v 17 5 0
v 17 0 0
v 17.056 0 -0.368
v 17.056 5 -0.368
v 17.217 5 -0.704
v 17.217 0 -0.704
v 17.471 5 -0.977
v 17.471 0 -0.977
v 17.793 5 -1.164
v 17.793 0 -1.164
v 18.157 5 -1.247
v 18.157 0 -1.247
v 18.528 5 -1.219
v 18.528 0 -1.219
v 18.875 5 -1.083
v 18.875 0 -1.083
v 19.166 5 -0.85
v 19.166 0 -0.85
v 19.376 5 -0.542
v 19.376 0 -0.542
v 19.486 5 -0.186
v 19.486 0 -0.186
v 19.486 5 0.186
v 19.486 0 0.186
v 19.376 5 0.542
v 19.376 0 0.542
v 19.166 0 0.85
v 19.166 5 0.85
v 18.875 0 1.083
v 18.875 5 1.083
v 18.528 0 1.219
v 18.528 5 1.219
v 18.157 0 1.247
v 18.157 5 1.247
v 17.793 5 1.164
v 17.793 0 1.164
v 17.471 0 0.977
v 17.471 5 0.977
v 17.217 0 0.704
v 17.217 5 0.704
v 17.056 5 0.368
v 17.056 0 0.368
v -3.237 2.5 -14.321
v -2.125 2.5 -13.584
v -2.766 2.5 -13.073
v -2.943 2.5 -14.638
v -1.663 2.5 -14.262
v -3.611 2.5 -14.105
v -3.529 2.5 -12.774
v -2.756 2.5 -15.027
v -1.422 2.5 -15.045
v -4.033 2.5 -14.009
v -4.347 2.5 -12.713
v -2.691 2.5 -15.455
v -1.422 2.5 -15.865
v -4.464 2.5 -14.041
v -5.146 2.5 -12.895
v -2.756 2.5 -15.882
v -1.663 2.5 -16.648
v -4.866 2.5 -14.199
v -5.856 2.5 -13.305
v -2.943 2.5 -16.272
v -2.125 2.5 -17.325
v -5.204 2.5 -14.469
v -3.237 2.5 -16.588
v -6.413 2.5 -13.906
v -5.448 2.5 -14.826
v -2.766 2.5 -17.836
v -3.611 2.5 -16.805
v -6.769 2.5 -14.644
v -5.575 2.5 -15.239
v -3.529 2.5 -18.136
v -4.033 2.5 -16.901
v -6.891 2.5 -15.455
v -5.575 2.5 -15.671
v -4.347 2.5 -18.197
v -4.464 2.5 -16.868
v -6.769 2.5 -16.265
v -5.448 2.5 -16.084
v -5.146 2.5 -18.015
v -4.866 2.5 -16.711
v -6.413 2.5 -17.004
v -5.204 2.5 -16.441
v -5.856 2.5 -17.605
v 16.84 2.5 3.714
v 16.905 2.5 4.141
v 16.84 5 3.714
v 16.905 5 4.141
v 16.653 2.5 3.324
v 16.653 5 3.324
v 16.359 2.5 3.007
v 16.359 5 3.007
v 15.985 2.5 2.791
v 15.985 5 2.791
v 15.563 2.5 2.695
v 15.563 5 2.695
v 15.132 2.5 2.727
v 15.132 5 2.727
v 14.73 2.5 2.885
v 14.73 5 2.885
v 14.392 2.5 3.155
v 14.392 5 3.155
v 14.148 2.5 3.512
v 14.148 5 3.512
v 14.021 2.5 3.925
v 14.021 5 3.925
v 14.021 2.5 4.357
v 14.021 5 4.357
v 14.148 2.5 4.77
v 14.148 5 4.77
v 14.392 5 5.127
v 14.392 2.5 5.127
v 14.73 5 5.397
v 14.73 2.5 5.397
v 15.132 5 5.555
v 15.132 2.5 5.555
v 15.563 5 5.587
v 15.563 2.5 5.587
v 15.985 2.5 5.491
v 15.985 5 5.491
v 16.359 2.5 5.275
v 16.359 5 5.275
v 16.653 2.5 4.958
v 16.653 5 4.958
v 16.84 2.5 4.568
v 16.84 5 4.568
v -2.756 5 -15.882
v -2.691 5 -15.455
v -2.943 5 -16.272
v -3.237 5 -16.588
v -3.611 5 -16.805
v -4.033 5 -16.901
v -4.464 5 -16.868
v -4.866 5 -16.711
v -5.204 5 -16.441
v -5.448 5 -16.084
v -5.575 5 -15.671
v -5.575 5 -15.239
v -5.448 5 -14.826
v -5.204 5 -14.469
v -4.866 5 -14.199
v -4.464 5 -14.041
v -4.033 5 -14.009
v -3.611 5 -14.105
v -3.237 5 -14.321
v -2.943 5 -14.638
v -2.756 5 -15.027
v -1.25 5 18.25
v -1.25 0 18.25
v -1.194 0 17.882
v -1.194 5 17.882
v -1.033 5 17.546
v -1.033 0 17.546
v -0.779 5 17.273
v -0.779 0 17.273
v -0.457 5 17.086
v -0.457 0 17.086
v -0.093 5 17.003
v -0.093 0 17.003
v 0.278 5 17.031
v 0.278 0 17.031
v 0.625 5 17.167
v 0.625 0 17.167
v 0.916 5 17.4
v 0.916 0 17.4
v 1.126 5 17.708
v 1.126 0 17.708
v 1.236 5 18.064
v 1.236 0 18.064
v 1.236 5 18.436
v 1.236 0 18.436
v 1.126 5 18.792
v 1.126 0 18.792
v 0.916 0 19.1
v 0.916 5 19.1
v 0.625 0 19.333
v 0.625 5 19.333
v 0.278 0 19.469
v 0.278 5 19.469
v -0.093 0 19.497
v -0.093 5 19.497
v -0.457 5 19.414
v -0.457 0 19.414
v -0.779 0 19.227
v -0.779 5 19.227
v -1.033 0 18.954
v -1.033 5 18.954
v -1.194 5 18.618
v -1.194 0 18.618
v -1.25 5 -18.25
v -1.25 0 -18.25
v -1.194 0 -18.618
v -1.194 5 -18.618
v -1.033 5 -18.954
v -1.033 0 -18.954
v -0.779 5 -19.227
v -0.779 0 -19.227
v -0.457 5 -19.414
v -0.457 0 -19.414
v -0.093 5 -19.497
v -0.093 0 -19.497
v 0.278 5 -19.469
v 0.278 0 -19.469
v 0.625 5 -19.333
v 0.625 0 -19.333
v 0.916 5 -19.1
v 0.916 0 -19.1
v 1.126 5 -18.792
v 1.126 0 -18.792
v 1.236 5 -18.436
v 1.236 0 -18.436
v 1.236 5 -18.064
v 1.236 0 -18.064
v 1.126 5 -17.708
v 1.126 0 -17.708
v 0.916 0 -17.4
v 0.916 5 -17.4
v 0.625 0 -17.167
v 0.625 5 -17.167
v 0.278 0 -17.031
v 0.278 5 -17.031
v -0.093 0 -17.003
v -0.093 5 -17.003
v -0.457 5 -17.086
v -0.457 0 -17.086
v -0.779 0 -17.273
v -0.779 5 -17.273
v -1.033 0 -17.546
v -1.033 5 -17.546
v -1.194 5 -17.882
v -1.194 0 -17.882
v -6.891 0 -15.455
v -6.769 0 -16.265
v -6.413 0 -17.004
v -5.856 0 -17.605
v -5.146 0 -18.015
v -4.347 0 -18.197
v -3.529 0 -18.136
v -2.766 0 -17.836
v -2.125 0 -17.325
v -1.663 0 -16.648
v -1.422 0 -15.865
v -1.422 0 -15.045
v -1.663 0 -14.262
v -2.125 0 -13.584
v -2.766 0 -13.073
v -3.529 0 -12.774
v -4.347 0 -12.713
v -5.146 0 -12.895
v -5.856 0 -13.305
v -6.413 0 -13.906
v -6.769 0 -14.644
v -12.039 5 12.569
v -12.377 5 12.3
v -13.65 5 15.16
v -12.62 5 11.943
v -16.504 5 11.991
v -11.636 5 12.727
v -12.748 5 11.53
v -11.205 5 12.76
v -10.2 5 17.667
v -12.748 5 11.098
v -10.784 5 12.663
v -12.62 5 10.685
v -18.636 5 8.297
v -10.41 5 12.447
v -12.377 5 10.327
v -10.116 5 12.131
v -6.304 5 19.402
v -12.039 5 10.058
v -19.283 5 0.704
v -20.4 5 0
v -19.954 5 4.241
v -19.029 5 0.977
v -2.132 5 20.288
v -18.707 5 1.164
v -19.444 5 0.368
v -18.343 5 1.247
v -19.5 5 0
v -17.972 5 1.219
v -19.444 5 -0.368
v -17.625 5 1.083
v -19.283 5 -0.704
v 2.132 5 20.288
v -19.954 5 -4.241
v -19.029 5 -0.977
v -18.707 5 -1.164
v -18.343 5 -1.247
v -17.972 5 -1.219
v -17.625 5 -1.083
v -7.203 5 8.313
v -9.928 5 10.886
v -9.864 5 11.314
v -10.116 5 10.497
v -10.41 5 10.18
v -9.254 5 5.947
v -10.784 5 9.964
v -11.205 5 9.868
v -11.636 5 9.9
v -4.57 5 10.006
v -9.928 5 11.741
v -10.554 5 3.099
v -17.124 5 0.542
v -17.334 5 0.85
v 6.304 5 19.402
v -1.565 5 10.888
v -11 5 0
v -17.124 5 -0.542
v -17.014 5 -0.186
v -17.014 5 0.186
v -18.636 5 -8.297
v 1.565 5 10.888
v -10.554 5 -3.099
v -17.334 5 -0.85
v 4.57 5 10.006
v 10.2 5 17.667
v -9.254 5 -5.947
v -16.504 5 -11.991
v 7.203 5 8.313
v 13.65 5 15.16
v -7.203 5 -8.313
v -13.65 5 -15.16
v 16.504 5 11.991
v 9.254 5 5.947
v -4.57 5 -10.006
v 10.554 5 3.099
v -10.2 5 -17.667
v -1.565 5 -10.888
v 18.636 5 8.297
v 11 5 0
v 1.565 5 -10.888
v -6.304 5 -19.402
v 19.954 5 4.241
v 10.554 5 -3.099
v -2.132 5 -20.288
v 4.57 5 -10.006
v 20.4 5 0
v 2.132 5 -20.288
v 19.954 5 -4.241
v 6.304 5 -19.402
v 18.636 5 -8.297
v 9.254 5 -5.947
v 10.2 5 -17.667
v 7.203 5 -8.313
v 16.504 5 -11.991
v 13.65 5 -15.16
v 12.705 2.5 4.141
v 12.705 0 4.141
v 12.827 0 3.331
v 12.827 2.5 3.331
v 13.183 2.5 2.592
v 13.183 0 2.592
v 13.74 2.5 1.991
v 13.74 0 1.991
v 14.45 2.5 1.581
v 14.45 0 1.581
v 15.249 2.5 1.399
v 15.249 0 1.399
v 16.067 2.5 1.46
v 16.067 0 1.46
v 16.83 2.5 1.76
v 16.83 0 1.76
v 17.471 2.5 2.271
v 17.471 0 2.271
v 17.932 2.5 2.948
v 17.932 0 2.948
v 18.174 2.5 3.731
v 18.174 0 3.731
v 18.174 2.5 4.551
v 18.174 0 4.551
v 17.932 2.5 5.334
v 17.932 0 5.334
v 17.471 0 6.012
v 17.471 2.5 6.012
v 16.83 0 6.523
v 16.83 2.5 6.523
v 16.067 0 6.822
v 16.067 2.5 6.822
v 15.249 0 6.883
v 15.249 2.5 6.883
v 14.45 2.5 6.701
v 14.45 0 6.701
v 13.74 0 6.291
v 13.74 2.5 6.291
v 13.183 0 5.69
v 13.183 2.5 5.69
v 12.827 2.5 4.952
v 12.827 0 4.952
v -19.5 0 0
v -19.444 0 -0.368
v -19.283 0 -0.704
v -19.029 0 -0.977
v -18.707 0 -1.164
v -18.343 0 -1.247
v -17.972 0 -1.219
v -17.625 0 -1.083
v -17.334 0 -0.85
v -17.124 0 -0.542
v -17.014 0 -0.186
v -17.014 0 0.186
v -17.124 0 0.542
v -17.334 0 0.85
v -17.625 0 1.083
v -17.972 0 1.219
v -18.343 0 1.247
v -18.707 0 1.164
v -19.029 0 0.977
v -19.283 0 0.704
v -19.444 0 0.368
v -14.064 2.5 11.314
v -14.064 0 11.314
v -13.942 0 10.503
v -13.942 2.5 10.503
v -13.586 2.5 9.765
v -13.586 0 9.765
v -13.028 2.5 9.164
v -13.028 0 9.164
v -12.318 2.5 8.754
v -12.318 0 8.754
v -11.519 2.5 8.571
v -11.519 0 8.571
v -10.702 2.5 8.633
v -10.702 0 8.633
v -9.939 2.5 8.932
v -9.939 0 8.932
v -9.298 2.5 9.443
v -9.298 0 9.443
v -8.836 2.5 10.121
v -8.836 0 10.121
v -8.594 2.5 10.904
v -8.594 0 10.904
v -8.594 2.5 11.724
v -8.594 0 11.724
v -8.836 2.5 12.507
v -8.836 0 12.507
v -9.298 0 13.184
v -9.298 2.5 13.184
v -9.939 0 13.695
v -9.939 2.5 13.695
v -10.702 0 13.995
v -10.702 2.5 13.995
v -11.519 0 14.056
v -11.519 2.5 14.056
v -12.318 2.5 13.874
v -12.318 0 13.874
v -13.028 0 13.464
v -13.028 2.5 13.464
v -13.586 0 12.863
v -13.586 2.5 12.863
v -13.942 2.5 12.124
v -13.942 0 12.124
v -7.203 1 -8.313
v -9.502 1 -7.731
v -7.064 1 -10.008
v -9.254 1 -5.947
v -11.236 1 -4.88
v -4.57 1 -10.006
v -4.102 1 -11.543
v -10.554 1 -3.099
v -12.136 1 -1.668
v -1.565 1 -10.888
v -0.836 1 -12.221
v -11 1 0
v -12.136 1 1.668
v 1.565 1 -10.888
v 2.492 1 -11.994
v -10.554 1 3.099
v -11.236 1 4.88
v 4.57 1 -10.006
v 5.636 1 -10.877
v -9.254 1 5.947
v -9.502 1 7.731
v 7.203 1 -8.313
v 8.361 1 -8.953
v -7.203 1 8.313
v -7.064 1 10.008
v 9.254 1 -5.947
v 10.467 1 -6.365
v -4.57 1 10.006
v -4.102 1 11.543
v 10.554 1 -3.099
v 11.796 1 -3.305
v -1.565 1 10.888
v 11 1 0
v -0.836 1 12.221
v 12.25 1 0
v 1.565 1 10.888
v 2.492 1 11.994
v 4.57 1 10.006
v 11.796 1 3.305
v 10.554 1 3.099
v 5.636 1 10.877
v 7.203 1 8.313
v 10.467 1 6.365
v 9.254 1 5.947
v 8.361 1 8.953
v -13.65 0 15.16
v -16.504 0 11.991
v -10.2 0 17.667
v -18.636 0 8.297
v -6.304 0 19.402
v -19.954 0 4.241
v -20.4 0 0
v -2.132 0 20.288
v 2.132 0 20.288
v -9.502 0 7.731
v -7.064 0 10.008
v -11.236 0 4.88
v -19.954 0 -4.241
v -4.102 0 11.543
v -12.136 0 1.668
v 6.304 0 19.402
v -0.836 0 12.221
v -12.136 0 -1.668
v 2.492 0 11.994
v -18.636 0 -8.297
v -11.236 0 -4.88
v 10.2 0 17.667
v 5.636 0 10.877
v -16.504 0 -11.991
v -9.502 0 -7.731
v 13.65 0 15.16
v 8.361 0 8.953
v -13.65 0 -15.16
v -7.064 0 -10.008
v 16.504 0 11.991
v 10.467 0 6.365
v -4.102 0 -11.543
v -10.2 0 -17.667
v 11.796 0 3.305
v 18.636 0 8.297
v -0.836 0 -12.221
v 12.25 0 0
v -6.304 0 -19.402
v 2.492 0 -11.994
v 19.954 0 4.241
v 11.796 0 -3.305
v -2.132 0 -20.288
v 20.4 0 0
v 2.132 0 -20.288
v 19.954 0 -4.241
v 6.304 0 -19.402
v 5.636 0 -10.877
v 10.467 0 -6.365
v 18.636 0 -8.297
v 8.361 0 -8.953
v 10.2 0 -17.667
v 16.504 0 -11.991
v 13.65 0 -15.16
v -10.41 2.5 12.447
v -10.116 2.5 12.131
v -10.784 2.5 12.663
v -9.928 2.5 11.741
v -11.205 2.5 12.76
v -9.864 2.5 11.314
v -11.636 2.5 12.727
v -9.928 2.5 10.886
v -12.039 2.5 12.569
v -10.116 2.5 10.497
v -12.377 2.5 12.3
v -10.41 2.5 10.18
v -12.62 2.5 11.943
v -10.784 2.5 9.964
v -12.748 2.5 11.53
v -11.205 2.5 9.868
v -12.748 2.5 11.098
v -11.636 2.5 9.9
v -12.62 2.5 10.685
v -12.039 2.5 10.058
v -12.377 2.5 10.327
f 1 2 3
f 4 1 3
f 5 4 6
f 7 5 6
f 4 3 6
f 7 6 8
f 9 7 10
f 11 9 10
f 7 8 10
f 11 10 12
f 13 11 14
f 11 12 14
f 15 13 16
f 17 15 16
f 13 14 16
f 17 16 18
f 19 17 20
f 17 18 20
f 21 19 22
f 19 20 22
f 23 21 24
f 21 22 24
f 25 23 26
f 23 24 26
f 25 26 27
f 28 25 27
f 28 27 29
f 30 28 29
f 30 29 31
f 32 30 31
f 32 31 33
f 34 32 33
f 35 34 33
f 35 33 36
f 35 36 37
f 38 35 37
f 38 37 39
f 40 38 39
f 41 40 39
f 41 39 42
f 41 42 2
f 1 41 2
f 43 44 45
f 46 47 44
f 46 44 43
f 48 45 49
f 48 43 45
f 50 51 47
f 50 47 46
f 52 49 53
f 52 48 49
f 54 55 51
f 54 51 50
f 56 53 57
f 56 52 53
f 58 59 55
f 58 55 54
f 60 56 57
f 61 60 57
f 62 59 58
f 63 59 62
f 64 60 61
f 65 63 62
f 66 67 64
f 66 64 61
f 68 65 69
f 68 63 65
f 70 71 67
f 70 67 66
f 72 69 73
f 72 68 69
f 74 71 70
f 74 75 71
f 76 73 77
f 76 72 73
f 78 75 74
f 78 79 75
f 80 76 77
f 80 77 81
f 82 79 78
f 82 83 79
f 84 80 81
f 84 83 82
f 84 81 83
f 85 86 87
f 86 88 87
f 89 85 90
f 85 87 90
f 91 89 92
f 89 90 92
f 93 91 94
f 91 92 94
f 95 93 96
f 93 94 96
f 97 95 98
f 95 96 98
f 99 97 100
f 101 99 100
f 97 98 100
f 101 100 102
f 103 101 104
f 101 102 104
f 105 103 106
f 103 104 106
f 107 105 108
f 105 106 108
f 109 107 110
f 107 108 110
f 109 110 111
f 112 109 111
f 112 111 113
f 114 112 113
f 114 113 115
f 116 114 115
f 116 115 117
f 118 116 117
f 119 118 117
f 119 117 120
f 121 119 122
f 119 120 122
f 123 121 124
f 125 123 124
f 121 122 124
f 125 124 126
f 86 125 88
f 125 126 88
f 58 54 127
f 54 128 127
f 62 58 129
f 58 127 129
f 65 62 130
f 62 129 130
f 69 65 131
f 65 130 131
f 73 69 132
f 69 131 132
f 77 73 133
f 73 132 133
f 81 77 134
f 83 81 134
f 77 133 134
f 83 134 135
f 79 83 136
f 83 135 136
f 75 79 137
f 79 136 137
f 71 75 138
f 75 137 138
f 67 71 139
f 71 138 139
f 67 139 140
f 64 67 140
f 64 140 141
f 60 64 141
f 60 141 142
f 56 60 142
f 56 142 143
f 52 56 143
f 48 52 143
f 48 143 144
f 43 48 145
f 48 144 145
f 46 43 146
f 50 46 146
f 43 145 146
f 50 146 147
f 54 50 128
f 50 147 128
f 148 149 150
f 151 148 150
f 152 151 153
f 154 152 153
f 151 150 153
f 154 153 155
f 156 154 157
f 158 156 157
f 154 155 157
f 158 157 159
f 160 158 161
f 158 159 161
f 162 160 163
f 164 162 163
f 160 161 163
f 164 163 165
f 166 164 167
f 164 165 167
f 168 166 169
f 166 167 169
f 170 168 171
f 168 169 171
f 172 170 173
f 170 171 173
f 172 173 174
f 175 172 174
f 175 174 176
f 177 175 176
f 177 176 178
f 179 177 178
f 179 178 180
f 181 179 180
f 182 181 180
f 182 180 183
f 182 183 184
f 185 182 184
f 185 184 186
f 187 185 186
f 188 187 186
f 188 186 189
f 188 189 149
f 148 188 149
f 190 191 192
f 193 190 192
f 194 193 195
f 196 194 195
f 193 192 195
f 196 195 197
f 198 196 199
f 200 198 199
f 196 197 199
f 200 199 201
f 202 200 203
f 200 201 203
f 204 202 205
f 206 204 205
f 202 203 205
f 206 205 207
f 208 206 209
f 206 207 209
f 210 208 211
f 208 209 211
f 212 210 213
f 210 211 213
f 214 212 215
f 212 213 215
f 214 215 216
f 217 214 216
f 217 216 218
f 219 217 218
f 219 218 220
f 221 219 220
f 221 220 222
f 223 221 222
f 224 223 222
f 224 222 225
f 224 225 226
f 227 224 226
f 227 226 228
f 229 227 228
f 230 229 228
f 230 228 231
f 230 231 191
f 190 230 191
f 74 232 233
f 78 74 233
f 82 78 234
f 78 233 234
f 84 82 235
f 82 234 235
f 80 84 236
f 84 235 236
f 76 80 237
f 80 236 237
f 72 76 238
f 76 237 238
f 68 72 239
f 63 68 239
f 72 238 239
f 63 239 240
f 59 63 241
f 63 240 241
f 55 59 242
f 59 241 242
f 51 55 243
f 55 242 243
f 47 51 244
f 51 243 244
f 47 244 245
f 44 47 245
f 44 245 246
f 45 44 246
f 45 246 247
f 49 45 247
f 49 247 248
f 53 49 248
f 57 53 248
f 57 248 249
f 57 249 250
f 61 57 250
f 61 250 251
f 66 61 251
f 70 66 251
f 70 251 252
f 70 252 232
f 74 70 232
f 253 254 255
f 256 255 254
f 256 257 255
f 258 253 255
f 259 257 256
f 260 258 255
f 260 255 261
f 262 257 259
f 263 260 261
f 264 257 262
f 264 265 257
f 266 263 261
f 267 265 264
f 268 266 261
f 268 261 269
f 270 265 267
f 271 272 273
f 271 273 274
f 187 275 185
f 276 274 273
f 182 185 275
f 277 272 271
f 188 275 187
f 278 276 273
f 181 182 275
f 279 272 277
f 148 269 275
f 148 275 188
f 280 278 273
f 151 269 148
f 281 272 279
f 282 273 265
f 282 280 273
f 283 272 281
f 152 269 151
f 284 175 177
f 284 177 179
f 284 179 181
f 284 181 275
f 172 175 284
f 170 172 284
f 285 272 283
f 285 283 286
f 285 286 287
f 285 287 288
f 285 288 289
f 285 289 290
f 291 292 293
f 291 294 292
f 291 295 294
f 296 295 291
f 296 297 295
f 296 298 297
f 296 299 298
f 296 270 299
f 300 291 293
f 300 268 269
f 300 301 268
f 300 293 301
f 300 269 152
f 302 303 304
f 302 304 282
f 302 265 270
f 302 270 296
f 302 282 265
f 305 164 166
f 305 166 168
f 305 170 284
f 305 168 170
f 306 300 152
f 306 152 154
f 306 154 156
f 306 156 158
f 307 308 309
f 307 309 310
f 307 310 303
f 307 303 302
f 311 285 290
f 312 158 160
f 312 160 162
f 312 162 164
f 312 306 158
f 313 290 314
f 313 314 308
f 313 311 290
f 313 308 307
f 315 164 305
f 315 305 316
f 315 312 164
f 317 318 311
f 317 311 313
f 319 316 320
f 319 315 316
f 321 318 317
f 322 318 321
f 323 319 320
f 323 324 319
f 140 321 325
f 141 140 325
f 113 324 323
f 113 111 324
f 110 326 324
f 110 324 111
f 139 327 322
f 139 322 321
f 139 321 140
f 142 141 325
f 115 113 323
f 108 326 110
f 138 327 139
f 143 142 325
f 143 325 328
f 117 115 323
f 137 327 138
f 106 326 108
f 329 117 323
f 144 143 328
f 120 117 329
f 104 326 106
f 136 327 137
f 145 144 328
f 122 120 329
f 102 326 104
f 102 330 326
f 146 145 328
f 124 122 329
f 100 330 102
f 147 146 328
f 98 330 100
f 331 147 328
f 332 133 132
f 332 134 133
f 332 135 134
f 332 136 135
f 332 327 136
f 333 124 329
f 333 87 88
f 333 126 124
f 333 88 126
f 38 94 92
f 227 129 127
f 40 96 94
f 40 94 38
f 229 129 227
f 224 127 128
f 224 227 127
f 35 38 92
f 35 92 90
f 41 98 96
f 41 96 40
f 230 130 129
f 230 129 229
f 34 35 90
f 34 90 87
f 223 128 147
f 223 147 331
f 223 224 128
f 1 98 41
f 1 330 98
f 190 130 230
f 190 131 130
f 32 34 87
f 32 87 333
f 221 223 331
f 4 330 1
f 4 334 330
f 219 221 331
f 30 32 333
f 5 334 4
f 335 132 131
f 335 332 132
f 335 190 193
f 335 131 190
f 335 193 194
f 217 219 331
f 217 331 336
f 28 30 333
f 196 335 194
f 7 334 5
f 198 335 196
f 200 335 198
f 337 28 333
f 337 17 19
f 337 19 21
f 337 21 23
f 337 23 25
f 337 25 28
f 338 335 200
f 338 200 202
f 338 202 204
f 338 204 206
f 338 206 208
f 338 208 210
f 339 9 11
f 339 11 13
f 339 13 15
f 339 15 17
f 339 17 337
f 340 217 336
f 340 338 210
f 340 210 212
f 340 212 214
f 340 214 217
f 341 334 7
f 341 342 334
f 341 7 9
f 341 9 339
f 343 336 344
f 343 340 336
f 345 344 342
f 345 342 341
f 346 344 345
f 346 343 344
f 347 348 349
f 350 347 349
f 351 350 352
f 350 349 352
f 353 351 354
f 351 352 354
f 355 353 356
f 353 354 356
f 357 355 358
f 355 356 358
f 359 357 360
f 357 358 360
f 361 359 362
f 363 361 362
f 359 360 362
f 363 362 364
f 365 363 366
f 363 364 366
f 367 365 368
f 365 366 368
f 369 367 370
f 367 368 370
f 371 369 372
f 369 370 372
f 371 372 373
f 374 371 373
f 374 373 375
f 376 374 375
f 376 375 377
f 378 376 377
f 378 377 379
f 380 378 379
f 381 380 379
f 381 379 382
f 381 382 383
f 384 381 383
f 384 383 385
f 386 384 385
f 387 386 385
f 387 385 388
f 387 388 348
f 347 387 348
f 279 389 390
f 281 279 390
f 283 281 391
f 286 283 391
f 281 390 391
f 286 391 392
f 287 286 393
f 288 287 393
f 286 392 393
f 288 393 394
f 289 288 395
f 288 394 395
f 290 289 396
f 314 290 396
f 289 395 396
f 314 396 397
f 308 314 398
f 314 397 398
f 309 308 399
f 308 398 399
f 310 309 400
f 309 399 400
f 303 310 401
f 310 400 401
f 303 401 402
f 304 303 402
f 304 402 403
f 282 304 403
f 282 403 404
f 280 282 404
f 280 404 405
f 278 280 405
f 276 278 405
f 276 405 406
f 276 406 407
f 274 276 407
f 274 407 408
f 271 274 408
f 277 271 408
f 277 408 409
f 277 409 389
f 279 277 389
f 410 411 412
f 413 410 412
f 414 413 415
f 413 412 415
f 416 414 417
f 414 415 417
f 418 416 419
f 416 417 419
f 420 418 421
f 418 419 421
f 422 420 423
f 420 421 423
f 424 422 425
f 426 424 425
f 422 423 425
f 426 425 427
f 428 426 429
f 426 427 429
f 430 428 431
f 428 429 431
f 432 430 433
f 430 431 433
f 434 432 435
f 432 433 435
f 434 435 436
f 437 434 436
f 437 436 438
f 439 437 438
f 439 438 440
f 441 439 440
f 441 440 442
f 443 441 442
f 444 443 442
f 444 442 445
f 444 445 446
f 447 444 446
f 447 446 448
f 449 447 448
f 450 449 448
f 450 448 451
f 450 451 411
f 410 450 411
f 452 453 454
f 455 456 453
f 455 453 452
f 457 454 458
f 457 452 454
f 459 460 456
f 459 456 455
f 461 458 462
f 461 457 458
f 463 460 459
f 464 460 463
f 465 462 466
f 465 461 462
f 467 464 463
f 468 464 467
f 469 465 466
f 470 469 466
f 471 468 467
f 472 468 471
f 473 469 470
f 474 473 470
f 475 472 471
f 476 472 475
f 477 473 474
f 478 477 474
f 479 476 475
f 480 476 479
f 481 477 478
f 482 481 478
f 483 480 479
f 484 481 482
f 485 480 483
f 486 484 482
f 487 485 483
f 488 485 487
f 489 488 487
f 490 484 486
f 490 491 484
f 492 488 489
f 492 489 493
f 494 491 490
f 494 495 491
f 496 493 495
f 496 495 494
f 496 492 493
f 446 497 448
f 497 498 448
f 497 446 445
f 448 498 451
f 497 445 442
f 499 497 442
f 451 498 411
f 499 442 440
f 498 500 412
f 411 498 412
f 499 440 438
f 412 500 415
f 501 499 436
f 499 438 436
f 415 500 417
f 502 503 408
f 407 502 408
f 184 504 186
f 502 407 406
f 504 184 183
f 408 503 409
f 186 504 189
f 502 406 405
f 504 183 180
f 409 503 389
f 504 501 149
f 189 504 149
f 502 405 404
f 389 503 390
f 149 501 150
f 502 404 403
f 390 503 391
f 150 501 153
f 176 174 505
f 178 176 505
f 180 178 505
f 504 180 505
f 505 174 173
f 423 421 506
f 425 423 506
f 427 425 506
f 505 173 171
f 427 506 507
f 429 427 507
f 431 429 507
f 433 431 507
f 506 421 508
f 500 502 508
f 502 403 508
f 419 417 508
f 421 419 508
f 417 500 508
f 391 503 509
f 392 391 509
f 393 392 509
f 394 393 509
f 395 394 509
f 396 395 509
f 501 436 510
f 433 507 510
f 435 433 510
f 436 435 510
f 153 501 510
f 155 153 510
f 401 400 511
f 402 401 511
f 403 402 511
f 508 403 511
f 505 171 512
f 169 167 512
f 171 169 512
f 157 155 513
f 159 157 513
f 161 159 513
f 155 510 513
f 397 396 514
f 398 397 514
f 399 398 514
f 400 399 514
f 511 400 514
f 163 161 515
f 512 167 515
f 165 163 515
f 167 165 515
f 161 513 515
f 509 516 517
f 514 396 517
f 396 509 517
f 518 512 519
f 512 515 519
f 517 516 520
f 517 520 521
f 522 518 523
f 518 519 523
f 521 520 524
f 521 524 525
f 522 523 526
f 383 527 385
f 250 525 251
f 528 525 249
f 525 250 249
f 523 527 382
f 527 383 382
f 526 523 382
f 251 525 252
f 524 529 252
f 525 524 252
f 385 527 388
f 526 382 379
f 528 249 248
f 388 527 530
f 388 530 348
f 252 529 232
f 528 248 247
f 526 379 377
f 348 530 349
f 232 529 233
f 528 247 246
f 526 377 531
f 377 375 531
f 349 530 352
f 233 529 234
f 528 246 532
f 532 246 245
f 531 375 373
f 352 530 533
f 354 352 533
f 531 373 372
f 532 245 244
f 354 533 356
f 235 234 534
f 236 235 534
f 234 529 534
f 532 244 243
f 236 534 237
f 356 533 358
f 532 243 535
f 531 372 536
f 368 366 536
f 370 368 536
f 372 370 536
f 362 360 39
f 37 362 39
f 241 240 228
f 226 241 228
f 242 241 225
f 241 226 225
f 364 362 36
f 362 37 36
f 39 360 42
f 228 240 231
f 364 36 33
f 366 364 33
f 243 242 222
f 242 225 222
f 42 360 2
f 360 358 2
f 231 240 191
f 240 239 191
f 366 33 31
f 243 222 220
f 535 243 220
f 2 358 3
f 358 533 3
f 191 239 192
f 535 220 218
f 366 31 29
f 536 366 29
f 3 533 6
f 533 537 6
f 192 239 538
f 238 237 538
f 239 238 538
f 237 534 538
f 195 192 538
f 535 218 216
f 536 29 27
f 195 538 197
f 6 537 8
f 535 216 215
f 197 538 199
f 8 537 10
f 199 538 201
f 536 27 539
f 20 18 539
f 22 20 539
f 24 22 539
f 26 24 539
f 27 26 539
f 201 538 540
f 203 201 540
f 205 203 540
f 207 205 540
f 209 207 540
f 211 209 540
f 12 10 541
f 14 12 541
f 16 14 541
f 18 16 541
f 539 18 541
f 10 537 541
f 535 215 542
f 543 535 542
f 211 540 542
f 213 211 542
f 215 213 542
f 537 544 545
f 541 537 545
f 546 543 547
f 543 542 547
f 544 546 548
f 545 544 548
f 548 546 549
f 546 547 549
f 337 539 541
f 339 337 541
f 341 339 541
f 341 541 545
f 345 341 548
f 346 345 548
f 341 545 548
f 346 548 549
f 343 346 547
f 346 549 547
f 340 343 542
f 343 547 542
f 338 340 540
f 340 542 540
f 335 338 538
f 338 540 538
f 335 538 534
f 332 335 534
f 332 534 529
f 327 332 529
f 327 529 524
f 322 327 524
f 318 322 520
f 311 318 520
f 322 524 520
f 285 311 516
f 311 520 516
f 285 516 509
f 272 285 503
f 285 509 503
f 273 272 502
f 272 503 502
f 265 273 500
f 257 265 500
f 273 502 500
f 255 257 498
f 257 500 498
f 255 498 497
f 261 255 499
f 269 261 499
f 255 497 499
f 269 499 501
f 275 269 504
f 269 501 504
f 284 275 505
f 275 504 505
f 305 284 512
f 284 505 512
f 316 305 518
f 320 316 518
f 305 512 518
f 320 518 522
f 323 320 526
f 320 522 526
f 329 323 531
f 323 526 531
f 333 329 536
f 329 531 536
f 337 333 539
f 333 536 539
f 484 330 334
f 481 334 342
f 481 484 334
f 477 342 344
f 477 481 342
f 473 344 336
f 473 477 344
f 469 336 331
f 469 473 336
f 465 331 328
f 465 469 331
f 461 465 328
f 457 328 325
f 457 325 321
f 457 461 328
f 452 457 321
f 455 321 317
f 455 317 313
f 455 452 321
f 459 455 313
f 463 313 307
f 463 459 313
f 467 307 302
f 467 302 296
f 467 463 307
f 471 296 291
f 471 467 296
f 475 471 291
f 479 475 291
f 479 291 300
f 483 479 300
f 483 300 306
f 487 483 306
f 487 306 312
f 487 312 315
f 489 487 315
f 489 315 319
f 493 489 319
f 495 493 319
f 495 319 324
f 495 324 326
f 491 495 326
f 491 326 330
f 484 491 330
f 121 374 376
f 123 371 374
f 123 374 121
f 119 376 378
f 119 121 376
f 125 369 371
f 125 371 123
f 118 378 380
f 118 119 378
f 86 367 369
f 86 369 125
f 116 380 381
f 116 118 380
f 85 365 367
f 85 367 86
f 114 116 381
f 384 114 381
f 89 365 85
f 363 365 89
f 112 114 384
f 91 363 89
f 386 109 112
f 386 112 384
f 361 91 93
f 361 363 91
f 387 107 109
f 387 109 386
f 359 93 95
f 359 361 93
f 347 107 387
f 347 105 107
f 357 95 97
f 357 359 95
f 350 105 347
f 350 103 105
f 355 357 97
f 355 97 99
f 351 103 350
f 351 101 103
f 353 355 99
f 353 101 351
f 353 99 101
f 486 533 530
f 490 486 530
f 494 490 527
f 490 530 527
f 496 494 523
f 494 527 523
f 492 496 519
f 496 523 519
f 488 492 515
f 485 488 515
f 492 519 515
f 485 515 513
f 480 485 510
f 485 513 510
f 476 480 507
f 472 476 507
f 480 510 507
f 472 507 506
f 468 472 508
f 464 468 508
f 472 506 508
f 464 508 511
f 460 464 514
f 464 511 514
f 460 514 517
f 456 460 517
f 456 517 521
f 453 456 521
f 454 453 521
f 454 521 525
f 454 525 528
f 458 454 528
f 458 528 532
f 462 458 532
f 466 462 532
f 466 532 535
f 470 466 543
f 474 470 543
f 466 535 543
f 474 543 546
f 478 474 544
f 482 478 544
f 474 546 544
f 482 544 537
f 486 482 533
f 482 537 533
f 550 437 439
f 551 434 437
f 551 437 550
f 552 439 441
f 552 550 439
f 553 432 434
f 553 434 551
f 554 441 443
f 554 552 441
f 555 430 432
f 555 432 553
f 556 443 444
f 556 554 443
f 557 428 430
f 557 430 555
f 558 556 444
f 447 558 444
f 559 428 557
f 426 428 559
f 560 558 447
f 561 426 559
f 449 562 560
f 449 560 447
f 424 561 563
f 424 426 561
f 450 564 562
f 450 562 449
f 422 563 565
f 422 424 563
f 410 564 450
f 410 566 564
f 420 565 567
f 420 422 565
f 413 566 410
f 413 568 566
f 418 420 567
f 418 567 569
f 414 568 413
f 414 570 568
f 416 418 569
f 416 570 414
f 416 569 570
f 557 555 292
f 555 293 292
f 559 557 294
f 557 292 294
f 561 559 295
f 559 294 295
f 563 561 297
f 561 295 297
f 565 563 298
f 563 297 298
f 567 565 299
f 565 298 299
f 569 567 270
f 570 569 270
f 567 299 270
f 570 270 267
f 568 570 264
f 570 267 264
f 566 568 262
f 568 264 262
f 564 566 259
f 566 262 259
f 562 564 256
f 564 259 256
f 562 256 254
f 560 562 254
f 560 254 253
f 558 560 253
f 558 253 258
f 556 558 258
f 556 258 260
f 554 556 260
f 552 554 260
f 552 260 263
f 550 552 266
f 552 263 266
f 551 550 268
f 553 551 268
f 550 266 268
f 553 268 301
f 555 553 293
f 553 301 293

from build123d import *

# Parameters (mm, degrees)
SKETCH_1_R                    = 20.4
SKETCH_1_R_2                  = 11
EXTRUDE_1_DEPTH               = 5
M3X0_51_D                     = 2.5
HOLE_WIZARD_M2_51_D           = 2.9
HOLE_WIZARD_M2_51_CBORE_D     = 5.5
HOLE_WIZARD_M2_51_CBORE_DEPTH = 2.5
SKETCH_9_R                    = 12.25
CUT_EXTRUDE_1_DEPTH           = 1


with BuildPart() as part:
    # Эскиз1 → Бобышка-Вытянуть1 (new body)
    with BuildSketch(Plane(origin=(0, 0, 0), x_dir=(1, 0, 0), z_dir=(0, 1, 0))):
        Circle(SKETCH_1_R)
        Circle(SKETCH_1_R_2, mode=Mode.SUBTRACT)
    extrude(amount=EXTRUDE_1_DEPTH)

    # Отверстие обработанное метчиком M3x0.51 (through all)
    with Locations(Plane(origin=(0, 5, 0), x_dir=(1, 0, 0), z_dir=(0, 1, 0))):
        with Locations((-18.25, 0), (0, 18.25), (18.25, 0), (0, -18.25)):
            Hole(M3X0_51_D / 2)

    # Цековка для винта с внутренним шестигранником M2.51 (through all)
    with Locations(Plane(origin=(0, 0, 0), x_dir=(-1, 0, 0), z_dir=(0, -1, 0))):
        with Locations((11.313708499, -11.313708499), (4.141104722, 15.454813221), (-15.454813221, -4.141104722)):
            CounterBoreHole(HOLE_WIZARD_M2_51_D / 2, HOLE_WIZARD_M2_51_CBORE_D / 2, HOLE_WIZARD_M2_51_CBORE_DEPTH)

    # Эскиз9 → Вырез-Вытянуть1 (cut)
    with BuildSketch(Plane.XZ):
        Circle(SKETCH_9_R)
    extrude(amount=-CUT_EXTRUDE_1_DEPTH, mode=Mode.SUBTRACT)


solid = part.part
